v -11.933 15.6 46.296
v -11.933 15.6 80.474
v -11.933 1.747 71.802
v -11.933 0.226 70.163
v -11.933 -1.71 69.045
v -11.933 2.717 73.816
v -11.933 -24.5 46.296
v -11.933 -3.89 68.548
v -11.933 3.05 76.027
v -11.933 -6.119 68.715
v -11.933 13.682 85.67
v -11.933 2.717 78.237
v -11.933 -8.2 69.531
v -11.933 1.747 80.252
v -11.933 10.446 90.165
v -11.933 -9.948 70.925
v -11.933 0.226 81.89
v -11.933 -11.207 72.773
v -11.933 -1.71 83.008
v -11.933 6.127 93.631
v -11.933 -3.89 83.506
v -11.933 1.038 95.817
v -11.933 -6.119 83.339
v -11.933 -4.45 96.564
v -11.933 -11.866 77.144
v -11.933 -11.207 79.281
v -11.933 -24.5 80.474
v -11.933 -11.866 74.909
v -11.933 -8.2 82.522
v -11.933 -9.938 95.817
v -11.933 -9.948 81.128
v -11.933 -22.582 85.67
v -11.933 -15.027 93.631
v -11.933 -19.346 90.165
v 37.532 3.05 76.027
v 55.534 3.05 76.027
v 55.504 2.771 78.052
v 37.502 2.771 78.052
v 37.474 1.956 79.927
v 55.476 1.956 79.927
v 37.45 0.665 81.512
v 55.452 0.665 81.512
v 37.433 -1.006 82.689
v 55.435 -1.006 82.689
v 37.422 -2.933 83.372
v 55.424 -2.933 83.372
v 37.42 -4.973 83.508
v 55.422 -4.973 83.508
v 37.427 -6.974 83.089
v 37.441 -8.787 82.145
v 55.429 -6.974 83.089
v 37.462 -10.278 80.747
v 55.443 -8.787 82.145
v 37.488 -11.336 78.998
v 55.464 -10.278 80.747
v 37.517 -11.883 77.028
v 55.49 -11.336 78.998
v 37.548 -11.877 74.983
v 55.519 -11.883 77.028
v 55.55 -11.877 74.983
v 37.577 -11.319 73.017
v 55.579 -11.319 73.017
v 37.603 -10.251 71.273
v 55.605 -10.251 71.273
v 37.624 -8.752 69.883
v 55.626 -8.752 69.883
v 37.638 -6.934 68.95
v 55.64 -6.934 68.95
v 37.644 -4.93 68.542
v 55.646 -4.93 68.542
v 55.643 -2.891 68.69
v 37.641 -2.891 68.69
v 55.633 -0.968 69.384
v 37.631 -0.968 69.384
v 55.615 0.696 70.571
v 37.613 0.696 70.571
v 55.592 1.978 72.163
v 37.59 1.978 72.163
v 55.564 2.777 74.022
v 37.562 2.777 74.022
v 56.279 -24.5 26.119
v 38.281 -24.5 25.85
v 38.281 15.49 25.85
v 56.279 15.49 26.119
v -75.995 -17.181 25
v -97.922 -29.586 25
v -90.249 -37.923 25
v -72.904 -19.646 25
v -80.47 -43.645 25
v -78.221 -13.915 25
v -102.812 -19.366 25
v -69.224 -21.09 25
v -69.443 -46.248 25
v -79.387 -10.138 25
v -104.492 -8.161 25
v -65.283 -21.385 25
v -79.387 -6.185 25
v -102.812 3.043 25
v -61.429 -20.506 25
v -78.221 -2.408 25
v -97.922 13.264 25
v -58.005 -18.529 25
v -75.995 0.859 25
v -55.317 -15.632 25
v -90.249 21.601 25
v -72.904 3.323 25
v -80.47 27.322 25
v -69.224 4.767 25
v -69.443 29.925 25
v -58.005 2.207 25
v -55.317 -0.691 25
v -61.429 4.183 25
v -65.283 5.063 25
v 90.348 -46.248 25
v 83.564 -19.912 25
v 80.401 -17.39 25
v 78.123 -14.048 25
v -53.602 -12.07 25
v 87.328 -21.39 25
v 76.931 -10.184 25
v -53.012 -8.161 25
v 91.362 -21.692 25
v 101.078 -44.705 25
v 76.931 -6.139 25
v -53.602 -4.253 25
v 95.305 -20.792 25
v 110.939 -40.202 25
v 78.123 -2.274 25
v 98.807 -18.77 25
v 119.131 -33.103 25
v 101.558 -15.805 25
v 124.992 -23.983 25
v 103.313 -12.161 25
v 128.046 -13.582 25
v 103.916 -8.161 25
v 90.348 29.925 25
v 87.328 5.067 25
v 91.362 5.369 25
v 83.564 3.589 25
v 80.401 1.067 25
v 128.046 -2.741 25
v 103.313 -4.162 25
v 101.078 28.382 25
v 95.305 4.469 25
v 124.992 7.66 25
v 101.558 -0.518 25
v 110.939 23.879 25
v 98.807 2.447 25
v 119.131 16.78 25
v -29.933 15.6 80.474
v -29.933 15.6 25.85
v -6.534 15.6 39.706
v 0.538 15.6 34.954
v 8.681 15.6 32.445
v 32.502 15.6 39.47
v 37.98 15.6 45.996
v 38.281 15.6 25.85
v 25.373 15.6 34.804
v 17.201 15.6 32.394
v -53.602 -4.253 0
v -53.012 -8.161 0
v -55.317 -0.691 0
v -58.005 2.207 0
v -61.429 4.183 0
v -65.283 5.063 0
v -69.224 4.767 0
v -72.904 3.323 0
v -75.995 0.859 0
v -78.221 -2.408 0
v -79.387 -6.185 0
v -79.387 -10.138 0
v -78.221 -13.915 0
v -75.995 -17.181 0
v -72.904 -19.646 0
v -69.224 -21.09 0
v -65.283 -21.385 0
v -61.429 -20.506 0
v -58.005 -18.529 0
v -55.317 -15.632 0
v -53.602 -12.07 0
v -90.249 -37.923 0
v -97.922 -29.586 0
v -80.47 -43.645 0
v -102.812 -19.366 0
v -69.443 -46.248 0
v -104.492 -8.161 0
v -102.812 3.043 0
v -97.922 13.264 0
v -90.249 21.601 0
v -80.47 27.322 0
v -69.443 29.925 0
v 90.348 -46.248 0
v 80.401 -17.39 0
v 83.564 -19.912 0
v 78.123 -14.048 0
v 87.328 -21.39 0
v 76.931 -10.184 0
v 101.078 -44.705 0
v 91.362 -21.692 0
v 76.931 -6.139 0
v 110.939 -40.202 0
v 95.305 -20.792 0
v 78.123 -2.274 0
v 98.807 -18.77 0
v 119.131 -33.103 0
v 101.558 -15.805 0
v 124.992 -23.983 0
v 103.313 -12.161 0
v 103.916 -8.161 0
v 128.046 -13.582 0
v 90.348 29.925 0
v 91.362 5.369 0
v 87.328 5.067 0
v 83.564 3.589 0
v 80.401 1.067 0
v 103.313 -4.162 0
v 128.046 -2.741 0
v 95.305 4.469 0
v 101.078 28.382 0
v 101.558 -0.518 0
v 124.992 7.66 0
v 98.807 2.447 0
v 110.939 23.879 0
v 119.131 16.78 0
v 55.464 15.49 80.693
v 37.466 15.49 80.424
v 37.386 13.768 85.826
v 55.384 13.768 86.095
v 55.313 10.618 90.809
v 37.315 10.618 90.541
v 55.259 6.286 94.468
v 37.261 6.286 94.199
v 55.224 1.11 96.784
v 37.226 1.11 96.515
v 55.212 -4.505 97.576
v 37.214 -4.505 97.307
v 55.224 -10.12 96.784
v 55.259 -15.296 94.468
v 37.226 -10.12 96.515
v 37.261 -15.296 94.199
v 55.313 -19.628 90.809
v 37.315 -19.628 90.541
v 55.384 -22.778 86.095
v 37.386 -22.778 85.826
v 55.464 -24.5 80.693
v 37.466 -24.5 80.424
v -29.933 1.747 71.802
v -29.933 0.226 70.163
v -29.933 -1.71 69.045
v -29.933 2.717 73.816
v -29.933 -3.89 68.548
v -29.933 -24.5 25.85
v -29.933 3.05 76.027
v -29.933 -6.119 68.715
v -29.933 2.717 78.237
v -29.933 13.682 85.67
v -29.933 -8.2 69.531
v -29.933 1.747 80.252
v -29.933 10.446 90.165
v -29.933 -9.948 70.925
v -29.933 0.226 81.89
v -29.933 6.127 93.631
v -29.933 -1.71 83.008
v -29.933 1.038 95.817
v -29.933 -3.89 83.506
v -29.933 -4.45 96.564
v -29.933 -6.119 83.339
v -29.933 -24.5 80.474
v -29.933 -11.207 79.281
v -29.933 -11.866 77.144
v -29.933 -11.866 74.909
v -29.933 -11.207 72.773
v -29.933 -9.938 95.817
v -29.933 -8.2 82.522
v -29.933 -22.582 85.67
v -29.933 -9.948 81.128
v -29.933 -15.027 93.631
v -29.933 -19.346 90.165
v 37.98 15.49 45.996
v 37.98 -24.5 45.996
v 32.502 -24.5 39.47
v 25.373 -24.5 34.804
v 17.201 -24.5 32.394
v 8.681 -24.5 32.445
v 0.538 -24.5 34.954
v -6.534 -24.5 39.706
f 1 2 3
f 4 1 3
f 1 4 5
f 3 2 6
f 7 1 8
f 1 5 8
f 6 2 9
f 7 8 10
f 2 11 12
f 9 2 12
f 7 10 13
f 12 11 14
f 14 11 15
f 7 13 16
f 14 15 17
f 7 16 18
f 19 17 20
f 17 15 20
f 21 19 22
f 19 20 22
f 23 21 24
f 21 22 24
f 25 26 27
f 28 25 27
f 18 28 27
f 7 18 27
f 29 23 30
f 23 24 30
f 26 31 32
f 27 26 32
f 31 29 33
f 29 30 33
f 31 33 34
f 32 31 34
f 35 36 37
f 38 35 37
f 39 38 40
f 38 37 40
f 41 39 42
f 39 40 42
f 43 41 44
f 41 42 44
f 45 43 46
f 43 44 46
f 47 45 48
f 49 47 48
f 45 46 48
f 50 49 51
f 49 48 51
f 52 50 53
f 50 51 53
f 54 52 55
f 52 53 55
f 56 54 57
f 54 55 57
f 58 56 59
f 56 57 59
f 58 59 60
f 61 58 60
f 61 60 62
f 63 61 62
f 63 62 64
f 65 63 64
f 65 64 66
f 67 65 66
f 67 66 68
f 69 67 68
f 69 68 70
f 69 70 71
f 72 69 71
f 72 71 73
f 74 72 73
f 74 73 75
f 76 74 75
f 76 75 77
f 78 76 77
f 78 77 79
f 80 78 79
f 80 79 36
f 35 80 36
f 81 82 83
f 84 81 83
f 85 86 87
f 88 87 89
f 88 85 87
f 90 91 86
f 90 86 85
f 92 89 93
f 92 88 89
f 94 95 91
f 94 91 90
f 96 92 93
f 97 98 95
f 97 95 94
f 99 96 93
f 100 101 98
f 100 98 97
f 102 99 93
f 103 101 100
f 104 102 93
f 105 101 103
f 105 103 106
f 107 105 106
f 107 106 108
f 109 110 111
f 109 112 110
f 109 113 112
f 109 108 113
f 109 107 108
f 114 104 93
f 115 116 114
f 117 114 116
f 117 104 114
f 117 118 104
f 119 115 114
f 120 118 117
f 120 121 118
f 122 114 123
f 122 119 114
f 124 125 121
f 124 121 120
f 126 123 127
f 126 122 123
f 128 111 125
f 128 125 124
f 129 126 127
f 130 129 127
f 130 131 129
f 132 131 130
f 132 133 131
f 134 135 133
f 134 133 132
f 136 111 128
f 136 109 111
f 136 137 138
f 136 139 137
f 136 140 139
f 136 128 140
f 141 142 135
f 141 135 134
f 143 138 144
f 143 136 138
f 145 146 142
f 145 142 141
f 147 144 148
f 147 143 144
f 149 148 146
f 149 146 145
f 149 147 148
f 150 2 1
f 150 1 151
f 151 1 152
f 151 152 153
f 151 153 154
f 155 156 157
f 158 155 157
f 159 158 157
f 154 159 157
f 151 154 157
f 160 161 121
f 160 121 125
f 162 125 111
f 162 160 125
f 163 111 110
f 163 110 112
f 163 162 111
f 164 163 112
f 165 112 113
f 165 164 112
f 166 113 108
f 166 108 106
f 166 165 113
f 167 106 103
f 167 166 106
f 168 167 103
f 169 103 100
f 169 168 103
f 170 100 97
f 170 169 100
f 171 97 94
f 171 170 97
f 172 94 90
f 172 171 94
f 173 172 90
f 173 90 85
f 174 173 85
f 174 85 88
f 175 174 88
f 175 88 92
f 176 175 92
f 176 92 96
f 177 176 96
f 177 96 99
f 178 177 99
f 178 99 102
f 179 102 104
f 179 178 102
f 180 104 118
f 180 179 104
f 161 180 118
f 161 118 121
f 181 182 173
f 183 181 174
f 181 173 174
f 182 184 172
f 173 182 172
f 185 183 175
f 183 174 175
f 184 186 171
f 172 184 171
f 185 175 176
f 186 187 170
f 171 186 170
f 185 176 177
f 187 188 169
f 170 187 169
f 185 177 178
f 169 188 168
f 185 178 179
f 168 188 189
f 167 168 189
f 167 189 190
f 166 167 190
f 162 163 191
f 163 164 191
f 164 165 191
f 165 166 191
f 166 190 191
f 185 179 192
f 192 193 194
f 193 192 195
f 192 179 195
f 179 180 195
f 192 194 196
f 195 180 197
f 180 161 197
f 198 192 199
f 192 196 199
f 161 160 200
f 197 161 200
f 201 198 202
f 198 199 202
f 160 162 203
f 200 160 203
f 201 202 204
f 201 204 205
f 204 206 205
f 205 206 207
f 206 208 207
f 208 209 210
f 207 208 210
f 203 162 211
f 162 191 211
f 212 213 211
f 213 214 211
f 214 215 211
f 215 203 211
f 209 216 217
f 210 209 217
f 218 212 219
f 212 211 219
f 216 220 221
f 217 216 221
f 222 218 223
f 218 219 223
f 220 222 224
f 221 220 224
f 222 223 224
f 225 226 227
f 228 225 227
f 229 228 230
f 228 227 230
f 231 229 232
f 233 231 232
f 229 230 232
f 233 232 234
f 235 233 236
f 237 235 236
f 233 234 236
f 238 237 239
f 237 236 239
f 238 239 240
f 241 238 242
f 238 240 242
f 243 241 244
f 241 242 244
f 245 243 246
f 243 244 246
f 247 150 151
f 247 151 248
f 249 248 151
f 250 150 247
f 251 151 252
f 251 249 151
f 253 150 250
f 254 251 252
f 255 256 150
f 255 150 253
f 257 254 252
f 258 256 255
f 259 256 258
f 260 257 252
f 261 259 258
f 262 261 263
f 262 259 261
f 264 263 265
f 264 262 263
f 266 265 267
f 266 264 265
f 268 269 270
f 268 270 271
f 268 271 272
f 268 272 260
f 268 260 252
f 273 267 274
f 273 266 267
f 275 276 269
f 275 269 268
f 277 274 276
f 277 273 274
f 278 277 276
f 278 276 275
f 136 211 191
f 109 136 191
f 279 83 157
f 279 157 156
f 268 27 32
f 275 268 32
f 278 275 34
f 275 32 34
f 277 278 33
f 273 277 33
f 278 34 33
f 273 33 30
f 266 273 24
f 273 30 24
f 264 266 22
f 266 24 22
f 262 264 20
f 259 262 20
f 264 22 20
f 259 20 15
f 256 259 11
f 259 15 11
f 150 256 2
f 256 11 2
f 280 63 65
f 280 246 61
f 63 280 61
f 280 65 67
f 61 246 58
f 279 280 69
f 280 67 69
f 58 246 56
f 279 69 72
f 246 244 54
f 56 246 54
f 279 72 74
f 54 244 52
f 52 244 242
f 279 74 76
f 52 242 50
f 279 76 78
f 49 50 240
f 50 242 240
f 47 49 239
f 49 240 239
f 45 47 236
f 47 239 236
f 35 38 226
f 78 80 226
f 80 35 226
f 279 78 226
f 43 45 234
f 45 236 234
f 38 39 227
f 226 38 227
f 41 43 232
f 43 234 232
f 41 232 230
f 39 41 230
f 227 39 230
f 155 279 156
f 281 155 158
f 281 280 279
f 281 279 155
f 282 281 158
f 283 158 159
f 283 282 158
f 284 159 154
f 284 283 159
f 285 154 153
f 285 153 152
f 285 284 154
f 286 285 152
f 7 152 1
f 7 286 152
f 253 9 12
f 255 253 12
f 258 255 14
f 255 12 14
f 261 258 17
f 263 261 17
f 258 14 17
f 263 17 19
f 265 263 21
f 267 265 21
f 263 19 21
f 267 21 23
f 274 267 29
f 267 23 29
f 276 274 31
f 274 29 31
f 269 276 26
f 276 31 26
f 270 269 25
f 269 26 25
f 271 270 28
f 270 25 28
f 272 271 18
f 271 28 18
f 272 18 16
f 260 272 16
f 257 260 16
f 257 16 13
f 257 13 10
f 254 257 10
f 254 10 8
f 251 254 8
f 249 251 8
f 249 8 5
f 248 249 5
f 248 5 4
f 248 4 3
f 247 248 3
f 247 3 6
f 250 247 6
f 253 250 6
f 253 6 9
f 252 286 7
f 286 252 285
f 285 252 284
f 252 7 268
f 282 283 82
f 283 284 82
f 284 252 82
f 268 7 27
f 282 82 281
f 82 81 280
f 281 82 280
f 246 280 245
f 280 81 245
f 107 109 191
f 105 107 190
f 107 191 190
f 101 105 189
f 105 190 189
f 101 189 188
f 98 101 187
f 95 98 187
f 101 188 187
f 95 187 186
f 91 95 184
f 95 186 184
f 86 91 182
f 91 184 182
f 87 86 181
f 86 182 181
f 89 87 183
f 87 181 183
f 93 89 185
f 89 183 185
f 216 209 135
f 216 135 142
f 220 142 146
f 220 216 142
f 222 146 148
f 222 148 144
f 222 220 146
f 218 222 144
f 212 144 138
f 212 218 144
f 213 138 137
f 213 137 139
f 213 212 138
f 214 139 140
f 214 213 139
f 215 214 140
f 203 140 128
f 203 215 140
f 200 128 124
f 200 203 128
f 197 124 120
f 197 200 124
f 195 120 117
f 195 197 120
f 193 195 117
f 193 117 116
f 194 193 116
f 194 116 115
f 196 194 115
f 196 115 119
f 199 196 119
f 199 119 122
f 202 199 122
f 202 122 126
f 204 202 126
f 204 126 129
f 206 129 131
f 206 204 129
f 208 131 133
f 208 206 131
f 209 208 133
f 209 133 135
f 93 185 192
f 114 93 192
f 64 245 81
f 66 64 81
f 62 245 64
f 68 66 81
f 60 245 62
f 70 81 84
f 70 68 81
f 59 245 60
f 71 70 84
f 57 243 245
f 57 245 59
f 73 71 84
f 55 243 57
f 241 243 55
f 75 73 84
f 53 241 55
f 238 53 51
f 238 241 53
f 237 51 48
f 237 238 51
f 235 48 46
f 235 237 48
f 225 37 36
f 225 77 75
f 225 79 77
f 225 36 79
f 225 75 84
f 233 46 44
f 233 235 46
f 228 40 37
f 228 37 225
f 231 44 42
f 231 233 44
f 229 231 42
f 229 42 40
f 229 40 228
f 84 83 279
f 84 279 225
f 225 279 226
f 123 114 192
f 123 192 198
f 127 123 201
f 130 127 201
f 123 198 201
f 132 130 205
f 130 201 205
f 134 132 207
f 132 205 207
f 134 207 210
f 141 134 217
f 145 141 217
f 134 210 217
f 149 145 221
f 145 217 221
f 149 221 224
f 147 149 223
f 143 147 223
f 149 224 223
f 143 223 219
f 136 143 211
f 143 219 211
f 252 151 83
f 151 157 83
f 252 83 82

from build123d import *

# Parameters (mm, degrees)
F0_R     = 13.2611397316
F0_R_2   = 13.5683268473
F1_DEPTH = 25
F3_DEPTH = 24.5
F4_DEPTH = 15.6
F5_W     = 39.9897291213
F5_H     = 20.1479245436
F7_DEPTH = 18
F6_W     = 40.1
F6_H     = 20.4463601112
F8_DEPTH = 18
F10_D    = 15


with BuildPart() as f1:
    # F0 (on Top) → F1 (new body)
    with BuildSketch(Plane.XY):
        with BuildLine():
            Line((90.3477221727, 29.9249999225), (-69.4431811571, 29.9249999225))
            ThreePointArc((-69.4431811571, 29.9249999225), (-104.4916182152, -8.1613641232), (-69.4431811571, -46.247728169))
            Line((-69.4431811571, -46.247728169), (90.3477221727, -46.247728169))
            ThreePointArc((90.3477221727, -46.247728169), (128.4340862185, -8.1613641232), (90.3477221727, 29.9249999225))
        make_face()
        with Locations((-66.2735935142, -8.1613641232)):
            Circle(F0_R, mode=Mode.SUBTRACT)
        with Locations((90.3477221727, -8.1613641232)):
            Circle(F0_R_2, mode=Mode.SUBTRACT)
    extrude(amount=F1_DEPTH)


with BuildPart() as f3:
    # F2 (on Front) → F3 (new body)
    with BuildSketch(Plane.XZ):
        with BuildLine():
            ThreePointArc((37.980210036, 45.9957942367), (12.939047745, 32.1071011983), (-11.932970956, 46.2964735925))
            Line((-11.932970956, 46.2964735925), (-11.932970956, 25.8501134813))
            Line((-11.932970956, 25.8501134813), (38.2808931172, 25.8501134813))
            Line((38.2808931172, 25.8501134813), (37.980210036, 45.9957942367))
        make_face()
    extrude(amount=F3_DEPTH)

    # F4 (add): a face of the model
    f4_faces = [f3.faces().sort_by_distance(p)[0] for p in [
        (13.0824643055, 0, 31.7920845241),
    ]]
    extrude(f4_faces, amount=F4_DEPTH)

    # F5 (on face) → F7 (join)
    with BuildSketch(Plane(origin=(38.6581055331, 0, 0.5769891037), x_dir=(0, 1, 0), z_dir=(0.9998886343, 0, 0.0149237744))):
        with BuildLine():
            Line((-24.5, 79.8561349511), (-24.5, 45.4238637944))
            Line((-24.5, 45.4238637944), (15.4897291213, 45.4238637944))
            Line((15.4897291213, 45.4238637944), (15.4897291213, 79.8561349511))
            ThreePointArc((15.4897291213, 79.8561349511), (-4.5051354393, 96.741283205), (-24.5, 79.8561349511))
        make_face()
        with Locations((-4.5051354393, 35.3499015226)):
            Rectangle(F5_W, F5_H)
    extrude(amount=F7_DEPTH)

    # F6 (on face) → F8 (join)
    with BuildSketch(Plane(origin=(-11.932970956, 0, 0), x_dir=(0, -1, 0), z_dir=(-1, 0, 0))):
        with BuildLine():
            Line((-15.6, 80.474384129), (-15.6, 46.2964735925))
            Line((-15.6, 46.2964735925), (24.5, 46.2964735925))
            Line((24.5, 46.2964735925), (24.5, 80.474384129))
            ThreePointArc((24.5, 80.474384129), (4.45, 96.5640700913), (-15.6, 80.474384129))
        make_face()
        with Locations((4.45, 36.0732935369)):
            Rectangle(F6_W, F6_H)
    extrude(amount=F8_DEPTH)

    # F10 (through all)
    with Locations(Plane(origin=(-29.932970956, 0, 0), x_dir=(0, -1, 0), z_dir=(-1, 0, 0))):
        with Locations((4.45, 76.0266743983)):
            Hole(F10_D / 2)


solid = Compound([f1.part, f3.part])
